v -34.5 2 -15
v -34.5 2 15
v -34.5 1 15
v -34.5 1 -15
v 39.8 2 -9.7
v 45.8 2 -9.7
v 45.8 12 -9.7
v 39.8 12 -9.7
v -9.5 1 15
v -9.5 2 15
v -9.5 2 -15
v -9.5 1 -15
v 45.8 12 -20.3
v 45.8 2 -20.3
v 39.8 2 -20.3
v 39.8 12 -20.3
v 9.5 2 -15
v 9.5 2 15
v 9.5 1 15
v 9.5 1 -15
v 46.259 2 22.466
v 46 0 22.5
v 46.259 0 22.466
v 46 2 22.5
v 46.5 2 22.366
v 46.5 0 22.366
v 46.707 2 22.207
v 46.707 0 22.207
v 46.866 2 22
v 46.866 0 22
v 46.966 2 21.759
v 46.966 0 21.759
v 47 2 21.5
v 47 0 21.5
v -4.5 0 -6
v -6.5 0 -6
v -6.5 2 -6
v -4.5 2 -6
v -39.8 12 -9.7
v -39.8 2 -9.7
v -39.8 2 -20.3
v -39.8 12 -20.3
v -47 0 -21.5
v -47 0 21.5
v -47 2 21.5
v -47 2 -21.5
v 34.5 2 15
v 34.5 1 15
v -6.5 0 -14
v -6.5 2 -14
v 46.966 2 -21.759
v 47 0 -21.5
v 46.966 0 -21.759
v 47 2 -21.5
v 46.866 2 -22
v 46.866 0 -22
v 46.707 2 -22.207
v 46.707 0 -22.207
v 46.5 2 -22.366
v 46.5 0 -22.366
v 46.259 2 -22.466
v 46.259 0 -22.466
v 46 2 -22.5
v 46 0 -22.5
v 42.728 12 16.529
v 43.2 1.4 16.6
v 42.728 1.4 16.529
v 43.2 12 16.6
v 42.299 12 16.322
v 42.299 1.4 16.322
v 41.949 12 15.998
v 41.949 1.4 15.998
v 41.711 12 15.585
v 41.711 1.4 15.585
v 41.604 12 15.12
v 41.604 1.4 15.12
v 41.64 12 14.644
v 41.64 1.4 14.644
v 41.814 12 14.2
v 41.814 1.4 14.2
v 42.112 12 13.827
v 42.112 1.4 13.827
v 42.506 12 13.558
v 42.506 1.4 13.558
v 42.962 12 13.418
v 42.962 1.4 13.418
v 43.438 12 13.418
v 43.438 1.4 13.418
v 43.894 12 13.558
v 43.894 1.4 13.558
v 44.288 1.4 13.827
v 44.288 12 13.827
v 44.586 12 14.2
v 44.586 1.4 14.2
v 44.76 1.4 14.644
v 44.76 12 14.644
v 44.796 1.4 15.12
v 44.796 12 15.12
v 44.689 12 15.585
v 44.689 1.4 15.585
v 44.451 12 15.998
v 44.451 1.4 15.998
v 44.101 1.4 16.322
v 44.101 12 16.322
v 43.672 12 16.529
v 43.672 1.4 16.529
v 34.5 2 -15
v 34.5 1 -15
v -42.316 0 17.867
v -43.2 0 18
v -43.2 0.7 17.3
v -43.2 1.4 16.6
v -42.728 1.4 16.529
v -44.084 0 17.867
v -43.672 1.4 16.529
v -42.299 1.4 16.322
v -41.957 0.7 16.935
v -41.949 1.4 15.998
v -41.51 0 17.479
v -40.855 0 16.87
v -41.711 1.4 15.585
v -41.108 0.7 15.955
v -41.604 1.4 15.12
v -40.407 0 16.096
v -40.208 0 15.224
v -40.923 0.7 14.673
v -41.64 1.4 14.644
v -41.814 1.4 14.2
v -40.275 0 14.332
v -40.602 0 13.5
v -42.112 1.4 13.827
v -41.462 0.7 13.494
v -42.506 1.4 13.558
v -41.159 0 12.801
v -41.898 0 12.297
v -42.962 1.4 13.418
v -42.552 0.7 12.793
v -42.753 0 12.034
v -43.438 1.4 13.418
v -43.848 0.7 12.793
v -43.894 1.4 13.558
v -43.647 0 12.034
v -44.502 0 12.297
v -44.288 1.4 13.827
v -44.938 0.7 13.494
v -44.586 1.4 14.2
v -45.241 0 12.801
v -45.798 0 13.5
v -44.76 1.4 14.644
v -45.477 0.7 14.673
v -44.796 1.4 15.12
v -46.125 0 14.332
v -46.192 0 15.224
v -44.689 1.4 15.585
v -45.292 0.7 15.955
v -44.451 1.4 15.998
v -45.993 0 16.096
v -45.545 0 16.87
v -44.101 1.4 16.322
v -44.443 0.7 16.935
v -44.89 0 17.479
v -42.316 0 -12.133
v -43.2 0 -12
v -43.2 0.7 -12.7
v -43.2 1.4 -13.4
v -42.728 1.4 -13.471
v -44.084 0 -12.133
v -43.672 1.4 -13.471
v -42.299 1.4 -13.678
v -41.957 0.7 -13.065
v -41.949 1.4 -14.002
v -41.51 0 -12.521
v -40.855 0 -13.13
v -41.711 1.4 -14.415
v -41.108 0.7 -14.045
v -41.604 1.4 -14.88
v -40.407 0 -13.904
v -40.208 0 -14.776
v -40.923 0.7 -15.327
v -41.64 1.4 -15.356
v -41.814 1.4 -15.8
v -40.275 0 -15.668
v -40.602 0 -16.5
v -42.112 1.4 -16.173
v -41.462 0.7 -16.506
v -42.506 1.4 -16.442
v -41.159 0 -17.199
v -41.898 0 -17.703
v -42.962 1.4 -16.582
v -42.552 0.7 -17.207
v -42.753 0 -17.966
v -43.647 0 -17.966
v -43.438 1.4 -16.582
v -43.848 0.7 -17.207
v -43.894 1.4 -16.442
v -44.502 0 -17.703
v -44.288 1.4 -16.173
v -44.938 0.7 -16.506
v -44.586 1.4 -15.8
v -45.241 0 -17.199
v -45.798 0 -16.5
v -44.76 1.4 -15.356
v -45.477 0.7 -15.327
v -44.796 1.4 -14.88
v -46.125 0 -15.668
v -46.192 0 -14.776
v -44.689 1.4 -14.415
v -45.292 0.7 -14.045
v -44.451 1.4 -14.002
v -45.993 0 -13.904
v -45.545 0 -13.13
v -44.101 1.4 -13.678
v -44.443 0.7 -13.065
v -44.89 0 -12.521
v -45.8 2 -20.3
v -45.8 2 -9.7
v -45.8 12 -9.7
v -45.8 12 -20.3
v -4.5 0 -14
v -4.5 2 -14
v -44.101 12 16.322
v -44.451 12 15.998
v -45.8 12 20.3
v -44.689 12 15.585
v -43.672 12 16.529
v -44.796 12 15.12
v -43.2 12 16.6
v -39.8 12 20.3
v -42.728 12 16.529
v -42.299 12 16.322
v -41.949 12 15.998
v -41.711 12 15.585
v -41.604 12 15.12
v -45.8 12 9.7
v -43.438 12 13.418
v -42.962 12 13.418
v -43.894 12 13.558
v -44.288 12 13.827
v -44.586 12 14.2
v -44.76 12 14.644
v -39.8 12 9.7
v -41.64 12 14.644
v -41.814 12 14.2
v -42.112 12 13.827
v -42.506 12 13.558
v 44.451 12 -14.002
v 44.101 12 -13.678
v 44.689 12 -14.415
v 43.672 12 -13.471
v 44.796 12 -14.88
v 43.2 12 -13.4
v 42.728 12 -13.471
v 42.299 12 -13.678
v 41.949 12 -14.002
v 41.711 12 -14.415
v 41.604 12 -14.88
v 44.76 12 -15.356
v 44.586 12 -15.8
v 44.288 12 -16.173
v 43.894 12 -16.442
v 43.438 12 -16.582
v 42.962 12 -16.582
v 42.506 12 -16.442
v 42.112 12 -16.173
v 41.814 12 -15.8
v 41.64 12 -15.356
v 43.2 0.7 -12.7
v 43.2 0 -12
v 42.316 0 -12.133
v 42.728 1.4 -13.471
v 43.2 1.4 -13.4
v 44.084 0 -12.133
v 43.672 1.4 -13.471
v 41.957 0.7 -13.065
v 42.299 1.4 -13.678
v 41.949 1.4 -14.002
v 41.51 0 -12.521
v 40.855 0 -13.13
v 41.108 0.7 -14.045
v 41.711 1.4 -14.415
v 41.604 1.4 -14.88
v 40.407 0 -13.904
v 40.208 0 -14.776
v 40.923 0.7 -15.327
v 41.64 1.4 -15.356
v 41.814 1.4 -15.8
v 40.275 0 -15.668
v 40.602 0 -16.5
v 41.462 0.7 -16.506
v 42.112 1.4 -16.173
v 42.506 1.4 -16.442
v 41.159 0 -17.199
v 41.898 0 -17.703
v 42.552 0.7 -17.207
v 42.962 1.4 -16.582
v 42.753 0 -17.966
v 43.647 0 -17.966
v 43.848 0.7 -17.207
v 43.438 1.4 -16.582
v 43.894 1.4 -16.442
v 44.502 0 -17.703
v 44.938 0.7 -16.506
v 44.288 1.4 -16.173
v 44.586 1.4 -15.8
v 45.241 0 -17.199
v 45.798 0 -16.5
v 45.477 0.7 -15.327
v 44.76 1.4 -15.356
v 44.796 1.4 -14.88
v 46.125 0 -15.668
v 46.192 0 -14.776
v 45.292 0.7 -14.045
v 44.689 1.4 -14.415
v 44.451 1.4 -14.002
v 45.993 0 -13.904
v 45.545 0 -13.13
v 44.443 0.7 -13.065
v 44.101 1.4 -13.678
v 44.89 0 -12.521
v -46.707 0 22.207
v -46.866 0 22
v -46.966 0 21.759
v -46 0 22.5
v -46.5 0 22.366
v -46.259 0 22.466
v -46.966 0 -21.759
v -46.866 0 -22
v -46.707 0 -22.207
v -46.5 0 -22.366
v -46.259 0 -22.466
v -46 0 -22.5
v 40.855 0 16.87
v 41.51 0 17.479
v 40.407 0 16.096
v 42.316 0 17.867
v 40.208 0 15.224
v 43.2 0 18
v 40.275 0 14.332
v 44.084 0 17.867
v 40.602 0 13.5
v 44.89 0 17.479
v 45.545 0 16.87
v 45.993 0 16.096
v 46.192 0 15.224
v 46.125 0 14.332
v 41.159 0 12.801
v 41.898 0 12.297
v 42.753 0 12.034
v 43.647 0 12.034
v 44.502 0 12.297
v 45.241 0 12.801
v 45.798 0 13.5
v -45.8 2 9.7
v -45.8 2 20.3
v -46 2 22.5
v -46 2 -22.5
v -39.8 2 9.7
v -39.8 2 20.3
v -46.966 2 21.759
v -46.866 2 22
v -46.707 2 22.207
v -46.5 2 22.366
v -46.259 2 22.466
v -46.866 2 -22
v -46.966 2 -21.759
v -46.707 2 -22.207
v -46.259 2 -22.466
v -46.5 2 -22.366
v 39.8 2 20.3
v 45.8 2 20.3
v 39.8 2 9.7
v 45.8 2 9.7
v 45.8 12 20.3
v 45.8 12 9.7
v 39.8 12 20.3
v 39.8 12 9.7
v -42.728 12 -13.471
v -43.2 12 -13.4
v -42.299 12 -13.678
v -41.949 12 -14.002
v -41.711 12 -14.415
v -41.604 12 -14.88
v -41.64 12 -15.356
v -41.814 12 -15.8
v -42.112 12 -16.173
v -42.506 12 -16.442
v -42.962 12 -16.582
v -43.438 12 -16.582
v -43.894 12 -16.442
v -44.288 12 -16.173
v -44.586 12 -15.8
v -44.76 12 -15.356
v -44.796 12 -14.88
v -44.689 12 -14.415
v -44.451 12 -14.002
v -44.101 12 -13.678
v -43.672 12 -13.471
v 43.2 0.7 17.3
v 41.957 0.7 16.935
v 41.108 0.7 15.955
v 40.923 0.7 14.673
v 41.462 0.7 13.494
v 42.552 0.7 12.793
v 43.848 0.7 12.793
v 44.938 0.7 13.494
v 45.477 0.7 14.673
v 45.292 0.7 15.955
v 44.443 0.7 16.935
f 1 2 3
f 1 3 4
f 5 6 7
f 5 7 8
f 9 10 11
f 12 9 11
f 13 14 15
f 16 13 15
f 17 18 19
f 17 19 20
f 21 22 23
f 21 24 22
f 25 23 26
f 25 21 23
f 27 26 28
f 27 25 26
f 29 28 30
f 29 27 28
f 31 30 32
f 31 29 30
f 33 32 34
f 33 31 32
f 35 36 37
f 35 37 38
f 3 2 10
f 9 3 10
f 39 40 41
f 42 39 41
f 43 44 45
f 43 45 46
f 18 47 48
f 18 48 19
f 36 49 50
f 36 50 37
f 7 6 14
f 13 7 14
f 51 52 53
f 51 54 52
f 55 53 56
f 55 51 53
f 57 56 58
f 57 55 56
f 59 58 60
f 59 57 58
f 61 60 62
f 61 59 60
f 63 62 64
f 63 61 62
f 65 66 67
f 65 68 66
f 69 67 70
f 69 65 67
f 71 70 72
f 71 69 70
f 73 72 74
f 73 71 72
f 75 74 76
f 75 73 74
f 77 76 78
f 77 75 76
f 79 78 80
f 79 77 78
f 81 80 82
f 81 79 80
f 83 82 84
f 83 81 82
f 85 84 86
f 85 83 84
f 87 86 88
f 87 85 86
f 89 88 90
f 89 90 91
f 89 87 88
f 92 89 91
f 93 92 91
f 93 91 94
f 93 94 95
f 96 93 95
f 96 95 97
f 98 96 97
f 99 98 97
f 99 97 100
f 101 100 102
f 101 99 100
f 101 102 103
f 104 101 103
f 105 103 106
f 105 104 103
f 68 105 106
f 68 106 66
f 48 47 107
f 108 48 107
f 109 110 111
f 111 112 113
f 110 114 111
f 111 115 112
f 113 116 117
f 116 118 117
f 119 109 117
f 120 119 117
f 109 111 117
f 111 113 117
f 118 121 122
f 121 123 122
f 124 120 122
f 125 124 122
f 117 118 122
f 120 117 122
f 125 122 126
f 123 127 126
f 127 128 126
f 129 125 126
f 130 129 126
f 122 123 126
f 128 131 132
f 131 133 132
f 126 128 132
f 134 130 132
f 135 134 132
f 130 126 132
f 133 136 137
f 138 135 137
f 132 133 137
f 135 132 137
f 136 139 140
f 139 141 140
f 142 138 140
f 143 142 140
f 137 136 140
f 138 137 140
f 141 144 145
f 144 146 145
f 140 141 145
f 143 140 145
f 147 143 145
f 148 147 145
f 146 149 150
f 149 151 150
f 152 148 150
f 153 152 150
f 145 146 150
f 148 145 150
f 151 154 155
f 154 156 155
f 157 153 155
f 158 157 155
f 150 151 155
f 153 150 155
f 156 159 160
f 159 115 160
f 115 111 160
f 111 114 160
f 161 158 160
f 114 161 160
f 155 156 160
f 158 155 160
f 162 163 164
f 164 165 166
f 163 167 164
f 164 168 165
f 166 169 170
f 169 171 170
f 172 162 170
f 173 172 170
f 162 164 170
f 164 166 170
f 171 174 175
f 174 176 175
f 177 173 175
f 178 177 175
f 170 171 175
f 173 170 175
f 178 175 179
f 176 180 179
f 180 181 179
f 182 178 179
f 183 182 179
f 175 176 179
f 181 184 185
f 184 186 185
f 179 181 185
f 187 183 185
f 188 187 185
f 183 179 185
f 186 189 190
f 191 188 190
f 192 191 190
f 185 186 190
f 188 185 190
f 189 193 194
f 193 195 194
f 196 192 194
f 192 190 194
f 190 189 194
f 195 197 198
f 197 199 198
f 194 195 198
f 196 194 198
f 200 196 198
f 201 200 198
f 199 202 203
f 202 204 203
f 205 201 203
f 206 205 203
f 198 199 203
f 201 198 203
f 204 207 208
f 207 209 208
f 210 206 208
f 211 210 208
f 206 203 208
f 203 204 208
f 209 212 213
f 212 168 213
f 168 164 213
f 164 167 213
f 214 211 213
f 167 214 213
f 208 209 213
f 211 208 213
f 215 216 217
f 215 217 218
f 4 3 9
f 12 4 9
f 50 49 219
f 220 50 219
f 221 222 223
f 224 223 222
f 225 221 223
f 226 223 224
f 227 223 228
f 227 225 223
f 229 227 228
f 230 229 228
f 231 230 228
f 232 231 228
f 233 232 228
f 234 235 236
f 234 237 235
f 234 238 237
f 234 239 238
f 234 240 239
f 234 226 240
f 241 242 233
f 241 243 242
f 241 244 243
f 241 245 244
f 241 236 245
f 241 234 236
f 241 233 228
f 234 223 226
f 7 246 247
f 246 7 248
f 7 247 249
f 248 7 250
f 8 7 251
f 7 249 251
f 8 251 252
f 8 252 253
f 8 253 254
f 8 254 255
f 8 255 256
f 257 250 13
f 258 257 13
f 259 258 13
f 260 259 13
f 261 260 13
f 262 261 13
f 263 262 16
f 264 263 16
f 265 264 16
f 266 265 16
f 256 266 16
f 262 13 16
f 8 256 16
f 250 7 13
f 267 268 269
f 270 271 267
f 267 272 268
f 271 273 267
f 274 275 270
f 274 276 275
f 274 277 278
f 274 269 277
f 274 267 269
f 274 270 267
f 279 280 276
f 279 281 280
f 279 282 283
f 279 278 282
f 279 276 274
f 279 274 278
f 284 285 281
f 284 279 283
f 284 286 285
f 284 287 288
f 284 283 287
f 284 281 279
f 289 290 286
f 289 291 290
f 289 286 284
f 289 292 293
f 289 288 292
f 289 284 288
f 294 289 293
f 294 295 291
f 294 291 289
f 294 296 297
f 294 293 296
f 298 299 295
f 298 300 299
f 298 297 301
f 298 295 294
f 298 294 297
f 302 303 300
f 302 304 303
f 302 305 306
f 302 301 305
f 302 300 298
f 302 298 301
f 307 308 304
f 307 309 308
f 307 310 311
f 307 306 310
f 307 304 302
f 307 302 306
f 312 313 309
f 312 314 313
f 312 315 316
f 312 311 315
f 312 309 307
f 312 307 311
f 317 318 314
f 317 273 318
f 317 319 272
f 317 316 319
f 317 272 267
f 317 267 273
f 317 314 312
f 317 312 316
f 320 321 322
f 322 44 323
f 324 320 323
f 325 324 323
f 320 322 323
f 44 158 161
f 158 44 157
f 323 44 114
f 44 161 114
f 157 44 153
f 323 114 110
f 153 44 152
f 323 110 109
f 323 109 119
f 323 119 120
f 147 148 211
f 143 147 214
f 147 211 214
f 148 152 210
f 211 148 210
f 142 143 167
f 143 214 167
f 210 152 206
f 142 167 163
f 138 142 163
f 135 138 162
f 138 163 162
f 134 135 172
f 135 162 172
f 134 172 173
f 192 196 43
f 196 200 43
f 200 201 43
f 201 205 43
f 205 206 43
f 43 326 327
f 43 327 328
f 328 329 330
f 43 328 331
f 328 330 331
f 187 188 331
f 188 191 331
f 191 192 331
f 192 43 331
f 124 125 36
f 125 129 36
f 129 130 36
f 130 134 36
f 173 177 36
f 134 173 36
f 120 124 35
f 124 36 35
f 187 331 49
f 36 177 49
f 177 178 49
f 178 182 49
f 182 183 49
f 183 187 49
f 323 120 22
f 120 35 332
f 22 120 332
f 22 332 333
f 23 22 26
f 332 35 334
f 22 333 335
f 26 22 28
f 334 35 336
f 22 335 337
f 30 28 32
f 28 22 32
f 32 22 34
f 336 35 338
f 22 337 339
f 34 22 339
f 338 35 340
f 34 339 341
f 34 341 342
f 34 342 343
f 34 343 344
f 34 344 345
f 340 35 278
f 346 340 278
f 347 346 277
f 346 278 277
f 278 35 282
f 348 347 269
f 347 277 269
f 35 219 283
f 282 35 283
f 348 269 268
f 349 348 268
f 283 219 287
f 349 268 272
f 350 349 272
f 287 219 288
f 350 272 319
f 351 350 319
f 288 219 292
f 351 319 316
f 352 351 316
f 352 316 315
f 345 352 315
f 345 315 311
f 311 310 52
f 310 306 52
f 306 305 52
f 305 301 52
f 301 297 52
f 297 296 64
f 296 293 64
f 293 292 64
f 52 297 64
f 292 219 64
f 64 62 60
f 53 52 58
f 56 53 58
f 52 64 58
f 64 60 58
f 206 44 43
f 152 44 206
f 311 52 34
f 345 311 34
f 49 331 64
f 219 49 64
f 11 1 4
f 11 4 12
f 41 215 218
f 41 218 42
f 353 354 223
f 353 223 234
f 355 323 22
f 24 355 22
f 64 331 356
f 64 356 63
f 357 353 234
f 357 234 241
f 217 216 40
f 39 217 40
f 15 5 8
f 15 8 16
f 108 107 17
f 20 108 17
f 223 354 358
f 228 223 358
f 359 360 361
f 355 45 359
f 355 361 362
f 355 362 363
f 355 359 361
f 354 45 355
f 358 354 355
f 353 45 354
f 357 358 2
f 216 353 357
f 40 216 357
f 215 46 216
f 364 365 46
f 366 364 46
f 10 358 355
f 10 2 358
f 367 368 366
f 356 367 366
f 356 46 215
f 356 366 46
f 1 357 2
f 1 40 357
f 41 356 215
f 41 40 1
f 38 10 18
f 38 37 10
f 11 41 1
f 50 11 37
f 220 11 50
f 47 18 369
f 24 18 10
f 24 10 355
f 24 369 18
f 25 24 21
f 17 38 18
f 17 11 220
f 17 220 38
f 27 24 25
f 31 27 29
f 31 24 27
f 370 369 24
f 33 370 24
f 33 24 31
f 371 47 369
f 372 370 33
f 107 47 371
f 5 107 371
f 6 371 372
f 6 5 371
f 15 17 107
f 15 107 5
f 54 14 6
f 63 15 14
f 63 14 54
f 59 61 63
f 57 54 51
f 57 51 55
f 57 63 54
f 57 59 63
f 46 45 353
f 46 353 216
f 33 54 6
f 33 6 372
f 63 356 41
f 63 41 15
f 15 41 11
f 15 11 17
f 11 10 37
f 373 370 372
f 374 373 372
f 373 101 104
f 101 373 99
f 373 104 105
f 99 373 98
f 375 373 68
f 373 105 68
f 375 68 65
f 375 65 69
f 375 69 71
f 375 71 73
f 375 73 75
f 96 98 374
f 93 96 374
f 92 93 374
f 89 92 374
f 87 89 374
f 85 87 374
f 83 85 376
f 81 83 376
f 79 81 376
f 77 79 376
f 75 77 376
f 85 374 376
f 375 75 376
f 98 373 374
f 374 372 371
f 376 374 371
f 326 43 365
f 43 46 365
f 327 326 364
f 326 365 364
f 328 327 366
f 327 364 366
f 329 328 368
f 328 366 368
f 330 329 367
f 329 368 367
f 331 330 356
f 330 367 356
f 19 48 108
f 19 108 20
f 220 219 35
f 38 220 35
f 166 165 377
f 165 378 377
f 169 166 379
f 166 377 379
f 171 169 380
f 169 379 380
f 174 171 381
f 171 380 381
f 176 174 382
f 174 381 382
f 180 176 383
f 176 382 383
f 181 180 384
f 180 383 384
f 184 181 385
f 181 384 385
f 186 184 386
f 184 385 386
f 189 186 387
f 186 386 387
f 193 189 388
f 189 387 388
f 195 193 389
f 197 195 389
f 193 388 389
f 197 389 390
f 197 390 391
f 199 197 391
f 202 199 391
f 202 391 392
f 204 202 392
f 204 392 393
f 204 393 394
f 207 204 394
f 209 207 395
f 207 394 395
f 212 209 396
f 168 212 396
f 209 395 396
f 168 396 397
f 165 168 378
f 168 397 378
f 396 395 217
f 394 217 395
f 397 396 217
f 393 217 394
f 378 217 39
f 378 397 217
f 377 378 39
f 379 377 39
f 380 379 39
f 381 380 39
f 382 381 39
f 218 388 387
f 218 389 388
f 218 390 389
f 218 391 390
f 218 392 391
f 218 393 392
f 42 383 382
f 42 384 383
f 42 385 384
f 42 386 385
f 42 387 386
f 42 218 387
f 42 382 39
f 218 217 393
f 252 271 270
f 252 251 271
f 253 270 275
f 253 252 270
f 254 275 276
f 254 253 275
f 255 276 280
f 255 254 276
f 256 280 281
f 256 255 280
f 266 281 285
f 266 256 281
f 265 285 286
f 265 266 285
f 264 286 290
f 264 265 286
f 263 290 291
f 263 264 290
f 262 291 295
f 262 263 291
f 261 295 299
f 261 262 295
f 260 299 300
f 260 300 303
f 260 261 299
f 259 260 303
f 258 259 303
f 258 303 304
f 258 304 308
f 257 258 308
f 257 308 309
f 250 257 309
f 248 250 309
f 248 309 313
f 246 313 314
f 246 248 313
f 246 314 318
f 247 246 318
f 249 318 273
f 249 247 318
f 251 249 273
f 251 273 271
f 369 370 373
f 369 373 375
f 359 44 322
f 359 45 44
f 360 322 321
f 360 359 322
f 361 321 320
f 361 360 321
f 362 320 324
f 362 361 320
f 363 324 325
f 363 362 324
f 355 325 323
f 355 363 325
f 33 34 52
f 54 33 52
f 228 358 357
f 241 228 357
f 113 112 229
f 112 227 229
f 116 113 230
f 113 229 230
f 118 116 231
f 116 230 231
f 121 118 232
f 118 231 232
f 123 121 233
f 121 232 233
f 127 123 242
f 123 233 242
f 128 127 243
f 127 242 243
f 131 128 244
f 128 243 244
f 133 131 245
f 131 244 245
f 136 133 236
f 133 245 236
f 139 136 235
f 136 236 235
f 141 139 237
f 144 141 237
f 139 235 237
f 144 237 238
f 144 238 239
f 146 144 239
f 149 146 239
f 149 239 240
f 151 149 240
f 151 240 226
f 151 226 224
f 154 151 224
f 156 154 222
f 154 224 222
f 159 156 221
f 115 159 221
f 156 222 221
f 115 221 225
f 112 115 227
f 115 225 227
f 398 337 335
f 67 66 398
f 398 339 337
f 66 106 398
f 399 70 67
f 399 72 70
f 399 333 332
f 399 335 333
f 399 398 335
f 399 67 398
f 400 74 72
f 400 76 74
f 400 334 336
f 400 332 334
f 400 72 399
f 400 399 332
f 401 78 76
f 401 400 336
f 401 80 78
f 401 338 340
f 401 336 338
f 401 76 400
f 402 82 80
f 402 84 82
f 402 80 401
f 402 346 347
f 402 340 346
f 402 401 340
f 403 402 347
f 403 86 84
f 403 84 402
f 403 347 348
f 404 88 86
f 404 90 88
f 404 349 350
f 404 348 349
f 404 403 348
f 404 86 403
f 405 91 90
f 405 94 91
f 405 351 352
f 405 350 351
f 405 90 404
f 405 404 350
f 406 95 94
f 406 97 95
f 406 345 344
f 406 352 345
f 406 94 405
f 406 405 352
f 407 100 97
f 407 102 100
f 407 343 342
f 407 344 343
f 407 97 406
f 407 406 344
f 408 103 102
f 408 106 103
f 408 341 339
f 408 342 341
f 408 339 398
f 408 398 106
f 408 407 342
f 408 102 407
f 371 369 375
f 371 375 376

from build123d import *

# Parameters (mm, degrees)
SKETCH1_W                                           = 94
SKETCH1_H                                           = 45
BOSS_EXTRUDE1_DEPTH                                 = 2
FILLET1_R                                           = 1
SKETCH2_W                                           = 6
SKETCH2_H                                           = 10.6
BOSS_EXTRUDE2_DEPTH                                 = 10
SKETCH8_W                                           = 25
SKETCH8_H                                           = 30
CUT_EXTRUDE1_DEPTH                                  = 1
CSK_FOR_M5_COUNTERSUNK_FLAT_HEAD_SCREW1_D           = 3.2
CSK_FOR_M5_COUNTERSUNK_FLAT_HEAD_SCREW1_DEPTH       = 15
CSK_FOR_M5_COUNTERSUNK_FLAT_HEAD_SCREW1_CSINK_D     = 6
CSK_FOR_M5_COUNTERSUNK_FLAT_HEAD_SCREW1_CSINK_ANGLE = 90
CUT_EXTRUDE2_REACH                                  = 55.472
SKETCH9_W                                           = 2
SKETCH9_H                                           = 8


with BuildPart() as part:
    # Sketch1 → Boss-Extrude1 (new body)
    with BuildSketch(Plane(origin=(0, 0, 0), x_dir=(1, 0, 0), z_dir=(0, 1, 0))):
        Rectangle(SKETCH1_W, SKETCH1_H)
    extrude(amount=BOSS_EXTRUDE1_DEPTH)

    # Fillet1
    fillet1_edges = [part.edges().sort_by_distance(p)[0] for p in [
        (-47, 1, 22.5),
        (47, 1, 22.5),
        (47, 1, -22.5),
        (-47, 1, -22.5),
    ]]
    fillet(fillet1_edges, radius=FILLET1_R)

    # Sketch2 → Boss-Extrude2 (add)
    with BuildSketch(Plane(origin=(0, 2, 0), x_dir=(1, 0, 0), z_dir=(0, 1, 0))):
        with Locations((-42.8, -15)):
            Rectangle(SKETCH2_W, SKETCH2_H)
        with Locations((-42.8, 15)):
            Rectangle(SKETCH2_W, SKETCH2_H)
    boss_extrude2 = extrude(amount=BOSS_EXTRUDE2_DEPTH)

    # Sketch8 → Cut-Extrude1 (cut)
    with BuildSketch(Plane(origin=(0, 2, 0), x_dir=(1, 0, 0), z_dir=(0, 1, 0))):
        with Locations((-22, 0)):
            Rectangle(SKETCH8_W, SKETCH8_H)
    cut_extrude1 = extrude(amount=-CUT_EXTRUDE1_DEPTH, mode=Mode.SUBTRACT)

    # CSK for M5 Countersunk Flat Head Screw1
    with Locations(Plane(origin=(-43.2, 0, -15), x_dir=(0, 0, -1), z_dir=(0, -1, 0))):
        with Locations((0, 0), (-30, 0)):
            csk_for_m5_countersunk_flat_head_screw1 = CounterSinkHole(CSK_FOR_M5_COUNTERSUNK_FLAT_HEAD_SCREW1_D / 2, CSK_FOR_M5_COUNTERSUNK_FLAT_HEAD_SCREW1_CSINK_D / 2, depth=CSK_FOR_M5_COUNTERSUNK_FLAT_HEAD_SCREW1_DEPTH, counter_sink_angle=CSK_FOR_M5_COUNTERSUNK_FLAT_HEAD_SCREW1_CSINK_ANGLE)

    # Mirror1: Boss-Extrude2, Cut-Extrude1, CSK for M5 Countersunk Flat Head Screw1 across plane
    add(boss_extrude2.mirror(Plane.ZY))
    add(cut_extrude1.mirror(Plane.ZY), mode=Mode.SUBTRACT)
    add(csk_for_m5_countersunk_flat_head_screw1.mirror(Plane.ZY), mode=Mode.SUBTRACT)

    # Sketch9 → Cut-Extrude2 (cut, up to next)
    with BuildSketch(Plane.XZ, mode=Mode.PRIVATE) as cut_extrude2_sk1:
        with Locations((-5.5, -10)):
            Rectangle(SKETCH9_W, SKETCH9_H)
    cut_extrude2_tool1 = extrude(cut_extrude2_sk1.sketch, amount=-CUT_EXTRUDE2_REACH, mode=Mode.PRIVATE) & part.part
    add(cut_extrude2_tool1.solids().sort_by_distance((-5.5, 0, -10))[0], mode=Mode.SUBTRACT)


solid = part.part
